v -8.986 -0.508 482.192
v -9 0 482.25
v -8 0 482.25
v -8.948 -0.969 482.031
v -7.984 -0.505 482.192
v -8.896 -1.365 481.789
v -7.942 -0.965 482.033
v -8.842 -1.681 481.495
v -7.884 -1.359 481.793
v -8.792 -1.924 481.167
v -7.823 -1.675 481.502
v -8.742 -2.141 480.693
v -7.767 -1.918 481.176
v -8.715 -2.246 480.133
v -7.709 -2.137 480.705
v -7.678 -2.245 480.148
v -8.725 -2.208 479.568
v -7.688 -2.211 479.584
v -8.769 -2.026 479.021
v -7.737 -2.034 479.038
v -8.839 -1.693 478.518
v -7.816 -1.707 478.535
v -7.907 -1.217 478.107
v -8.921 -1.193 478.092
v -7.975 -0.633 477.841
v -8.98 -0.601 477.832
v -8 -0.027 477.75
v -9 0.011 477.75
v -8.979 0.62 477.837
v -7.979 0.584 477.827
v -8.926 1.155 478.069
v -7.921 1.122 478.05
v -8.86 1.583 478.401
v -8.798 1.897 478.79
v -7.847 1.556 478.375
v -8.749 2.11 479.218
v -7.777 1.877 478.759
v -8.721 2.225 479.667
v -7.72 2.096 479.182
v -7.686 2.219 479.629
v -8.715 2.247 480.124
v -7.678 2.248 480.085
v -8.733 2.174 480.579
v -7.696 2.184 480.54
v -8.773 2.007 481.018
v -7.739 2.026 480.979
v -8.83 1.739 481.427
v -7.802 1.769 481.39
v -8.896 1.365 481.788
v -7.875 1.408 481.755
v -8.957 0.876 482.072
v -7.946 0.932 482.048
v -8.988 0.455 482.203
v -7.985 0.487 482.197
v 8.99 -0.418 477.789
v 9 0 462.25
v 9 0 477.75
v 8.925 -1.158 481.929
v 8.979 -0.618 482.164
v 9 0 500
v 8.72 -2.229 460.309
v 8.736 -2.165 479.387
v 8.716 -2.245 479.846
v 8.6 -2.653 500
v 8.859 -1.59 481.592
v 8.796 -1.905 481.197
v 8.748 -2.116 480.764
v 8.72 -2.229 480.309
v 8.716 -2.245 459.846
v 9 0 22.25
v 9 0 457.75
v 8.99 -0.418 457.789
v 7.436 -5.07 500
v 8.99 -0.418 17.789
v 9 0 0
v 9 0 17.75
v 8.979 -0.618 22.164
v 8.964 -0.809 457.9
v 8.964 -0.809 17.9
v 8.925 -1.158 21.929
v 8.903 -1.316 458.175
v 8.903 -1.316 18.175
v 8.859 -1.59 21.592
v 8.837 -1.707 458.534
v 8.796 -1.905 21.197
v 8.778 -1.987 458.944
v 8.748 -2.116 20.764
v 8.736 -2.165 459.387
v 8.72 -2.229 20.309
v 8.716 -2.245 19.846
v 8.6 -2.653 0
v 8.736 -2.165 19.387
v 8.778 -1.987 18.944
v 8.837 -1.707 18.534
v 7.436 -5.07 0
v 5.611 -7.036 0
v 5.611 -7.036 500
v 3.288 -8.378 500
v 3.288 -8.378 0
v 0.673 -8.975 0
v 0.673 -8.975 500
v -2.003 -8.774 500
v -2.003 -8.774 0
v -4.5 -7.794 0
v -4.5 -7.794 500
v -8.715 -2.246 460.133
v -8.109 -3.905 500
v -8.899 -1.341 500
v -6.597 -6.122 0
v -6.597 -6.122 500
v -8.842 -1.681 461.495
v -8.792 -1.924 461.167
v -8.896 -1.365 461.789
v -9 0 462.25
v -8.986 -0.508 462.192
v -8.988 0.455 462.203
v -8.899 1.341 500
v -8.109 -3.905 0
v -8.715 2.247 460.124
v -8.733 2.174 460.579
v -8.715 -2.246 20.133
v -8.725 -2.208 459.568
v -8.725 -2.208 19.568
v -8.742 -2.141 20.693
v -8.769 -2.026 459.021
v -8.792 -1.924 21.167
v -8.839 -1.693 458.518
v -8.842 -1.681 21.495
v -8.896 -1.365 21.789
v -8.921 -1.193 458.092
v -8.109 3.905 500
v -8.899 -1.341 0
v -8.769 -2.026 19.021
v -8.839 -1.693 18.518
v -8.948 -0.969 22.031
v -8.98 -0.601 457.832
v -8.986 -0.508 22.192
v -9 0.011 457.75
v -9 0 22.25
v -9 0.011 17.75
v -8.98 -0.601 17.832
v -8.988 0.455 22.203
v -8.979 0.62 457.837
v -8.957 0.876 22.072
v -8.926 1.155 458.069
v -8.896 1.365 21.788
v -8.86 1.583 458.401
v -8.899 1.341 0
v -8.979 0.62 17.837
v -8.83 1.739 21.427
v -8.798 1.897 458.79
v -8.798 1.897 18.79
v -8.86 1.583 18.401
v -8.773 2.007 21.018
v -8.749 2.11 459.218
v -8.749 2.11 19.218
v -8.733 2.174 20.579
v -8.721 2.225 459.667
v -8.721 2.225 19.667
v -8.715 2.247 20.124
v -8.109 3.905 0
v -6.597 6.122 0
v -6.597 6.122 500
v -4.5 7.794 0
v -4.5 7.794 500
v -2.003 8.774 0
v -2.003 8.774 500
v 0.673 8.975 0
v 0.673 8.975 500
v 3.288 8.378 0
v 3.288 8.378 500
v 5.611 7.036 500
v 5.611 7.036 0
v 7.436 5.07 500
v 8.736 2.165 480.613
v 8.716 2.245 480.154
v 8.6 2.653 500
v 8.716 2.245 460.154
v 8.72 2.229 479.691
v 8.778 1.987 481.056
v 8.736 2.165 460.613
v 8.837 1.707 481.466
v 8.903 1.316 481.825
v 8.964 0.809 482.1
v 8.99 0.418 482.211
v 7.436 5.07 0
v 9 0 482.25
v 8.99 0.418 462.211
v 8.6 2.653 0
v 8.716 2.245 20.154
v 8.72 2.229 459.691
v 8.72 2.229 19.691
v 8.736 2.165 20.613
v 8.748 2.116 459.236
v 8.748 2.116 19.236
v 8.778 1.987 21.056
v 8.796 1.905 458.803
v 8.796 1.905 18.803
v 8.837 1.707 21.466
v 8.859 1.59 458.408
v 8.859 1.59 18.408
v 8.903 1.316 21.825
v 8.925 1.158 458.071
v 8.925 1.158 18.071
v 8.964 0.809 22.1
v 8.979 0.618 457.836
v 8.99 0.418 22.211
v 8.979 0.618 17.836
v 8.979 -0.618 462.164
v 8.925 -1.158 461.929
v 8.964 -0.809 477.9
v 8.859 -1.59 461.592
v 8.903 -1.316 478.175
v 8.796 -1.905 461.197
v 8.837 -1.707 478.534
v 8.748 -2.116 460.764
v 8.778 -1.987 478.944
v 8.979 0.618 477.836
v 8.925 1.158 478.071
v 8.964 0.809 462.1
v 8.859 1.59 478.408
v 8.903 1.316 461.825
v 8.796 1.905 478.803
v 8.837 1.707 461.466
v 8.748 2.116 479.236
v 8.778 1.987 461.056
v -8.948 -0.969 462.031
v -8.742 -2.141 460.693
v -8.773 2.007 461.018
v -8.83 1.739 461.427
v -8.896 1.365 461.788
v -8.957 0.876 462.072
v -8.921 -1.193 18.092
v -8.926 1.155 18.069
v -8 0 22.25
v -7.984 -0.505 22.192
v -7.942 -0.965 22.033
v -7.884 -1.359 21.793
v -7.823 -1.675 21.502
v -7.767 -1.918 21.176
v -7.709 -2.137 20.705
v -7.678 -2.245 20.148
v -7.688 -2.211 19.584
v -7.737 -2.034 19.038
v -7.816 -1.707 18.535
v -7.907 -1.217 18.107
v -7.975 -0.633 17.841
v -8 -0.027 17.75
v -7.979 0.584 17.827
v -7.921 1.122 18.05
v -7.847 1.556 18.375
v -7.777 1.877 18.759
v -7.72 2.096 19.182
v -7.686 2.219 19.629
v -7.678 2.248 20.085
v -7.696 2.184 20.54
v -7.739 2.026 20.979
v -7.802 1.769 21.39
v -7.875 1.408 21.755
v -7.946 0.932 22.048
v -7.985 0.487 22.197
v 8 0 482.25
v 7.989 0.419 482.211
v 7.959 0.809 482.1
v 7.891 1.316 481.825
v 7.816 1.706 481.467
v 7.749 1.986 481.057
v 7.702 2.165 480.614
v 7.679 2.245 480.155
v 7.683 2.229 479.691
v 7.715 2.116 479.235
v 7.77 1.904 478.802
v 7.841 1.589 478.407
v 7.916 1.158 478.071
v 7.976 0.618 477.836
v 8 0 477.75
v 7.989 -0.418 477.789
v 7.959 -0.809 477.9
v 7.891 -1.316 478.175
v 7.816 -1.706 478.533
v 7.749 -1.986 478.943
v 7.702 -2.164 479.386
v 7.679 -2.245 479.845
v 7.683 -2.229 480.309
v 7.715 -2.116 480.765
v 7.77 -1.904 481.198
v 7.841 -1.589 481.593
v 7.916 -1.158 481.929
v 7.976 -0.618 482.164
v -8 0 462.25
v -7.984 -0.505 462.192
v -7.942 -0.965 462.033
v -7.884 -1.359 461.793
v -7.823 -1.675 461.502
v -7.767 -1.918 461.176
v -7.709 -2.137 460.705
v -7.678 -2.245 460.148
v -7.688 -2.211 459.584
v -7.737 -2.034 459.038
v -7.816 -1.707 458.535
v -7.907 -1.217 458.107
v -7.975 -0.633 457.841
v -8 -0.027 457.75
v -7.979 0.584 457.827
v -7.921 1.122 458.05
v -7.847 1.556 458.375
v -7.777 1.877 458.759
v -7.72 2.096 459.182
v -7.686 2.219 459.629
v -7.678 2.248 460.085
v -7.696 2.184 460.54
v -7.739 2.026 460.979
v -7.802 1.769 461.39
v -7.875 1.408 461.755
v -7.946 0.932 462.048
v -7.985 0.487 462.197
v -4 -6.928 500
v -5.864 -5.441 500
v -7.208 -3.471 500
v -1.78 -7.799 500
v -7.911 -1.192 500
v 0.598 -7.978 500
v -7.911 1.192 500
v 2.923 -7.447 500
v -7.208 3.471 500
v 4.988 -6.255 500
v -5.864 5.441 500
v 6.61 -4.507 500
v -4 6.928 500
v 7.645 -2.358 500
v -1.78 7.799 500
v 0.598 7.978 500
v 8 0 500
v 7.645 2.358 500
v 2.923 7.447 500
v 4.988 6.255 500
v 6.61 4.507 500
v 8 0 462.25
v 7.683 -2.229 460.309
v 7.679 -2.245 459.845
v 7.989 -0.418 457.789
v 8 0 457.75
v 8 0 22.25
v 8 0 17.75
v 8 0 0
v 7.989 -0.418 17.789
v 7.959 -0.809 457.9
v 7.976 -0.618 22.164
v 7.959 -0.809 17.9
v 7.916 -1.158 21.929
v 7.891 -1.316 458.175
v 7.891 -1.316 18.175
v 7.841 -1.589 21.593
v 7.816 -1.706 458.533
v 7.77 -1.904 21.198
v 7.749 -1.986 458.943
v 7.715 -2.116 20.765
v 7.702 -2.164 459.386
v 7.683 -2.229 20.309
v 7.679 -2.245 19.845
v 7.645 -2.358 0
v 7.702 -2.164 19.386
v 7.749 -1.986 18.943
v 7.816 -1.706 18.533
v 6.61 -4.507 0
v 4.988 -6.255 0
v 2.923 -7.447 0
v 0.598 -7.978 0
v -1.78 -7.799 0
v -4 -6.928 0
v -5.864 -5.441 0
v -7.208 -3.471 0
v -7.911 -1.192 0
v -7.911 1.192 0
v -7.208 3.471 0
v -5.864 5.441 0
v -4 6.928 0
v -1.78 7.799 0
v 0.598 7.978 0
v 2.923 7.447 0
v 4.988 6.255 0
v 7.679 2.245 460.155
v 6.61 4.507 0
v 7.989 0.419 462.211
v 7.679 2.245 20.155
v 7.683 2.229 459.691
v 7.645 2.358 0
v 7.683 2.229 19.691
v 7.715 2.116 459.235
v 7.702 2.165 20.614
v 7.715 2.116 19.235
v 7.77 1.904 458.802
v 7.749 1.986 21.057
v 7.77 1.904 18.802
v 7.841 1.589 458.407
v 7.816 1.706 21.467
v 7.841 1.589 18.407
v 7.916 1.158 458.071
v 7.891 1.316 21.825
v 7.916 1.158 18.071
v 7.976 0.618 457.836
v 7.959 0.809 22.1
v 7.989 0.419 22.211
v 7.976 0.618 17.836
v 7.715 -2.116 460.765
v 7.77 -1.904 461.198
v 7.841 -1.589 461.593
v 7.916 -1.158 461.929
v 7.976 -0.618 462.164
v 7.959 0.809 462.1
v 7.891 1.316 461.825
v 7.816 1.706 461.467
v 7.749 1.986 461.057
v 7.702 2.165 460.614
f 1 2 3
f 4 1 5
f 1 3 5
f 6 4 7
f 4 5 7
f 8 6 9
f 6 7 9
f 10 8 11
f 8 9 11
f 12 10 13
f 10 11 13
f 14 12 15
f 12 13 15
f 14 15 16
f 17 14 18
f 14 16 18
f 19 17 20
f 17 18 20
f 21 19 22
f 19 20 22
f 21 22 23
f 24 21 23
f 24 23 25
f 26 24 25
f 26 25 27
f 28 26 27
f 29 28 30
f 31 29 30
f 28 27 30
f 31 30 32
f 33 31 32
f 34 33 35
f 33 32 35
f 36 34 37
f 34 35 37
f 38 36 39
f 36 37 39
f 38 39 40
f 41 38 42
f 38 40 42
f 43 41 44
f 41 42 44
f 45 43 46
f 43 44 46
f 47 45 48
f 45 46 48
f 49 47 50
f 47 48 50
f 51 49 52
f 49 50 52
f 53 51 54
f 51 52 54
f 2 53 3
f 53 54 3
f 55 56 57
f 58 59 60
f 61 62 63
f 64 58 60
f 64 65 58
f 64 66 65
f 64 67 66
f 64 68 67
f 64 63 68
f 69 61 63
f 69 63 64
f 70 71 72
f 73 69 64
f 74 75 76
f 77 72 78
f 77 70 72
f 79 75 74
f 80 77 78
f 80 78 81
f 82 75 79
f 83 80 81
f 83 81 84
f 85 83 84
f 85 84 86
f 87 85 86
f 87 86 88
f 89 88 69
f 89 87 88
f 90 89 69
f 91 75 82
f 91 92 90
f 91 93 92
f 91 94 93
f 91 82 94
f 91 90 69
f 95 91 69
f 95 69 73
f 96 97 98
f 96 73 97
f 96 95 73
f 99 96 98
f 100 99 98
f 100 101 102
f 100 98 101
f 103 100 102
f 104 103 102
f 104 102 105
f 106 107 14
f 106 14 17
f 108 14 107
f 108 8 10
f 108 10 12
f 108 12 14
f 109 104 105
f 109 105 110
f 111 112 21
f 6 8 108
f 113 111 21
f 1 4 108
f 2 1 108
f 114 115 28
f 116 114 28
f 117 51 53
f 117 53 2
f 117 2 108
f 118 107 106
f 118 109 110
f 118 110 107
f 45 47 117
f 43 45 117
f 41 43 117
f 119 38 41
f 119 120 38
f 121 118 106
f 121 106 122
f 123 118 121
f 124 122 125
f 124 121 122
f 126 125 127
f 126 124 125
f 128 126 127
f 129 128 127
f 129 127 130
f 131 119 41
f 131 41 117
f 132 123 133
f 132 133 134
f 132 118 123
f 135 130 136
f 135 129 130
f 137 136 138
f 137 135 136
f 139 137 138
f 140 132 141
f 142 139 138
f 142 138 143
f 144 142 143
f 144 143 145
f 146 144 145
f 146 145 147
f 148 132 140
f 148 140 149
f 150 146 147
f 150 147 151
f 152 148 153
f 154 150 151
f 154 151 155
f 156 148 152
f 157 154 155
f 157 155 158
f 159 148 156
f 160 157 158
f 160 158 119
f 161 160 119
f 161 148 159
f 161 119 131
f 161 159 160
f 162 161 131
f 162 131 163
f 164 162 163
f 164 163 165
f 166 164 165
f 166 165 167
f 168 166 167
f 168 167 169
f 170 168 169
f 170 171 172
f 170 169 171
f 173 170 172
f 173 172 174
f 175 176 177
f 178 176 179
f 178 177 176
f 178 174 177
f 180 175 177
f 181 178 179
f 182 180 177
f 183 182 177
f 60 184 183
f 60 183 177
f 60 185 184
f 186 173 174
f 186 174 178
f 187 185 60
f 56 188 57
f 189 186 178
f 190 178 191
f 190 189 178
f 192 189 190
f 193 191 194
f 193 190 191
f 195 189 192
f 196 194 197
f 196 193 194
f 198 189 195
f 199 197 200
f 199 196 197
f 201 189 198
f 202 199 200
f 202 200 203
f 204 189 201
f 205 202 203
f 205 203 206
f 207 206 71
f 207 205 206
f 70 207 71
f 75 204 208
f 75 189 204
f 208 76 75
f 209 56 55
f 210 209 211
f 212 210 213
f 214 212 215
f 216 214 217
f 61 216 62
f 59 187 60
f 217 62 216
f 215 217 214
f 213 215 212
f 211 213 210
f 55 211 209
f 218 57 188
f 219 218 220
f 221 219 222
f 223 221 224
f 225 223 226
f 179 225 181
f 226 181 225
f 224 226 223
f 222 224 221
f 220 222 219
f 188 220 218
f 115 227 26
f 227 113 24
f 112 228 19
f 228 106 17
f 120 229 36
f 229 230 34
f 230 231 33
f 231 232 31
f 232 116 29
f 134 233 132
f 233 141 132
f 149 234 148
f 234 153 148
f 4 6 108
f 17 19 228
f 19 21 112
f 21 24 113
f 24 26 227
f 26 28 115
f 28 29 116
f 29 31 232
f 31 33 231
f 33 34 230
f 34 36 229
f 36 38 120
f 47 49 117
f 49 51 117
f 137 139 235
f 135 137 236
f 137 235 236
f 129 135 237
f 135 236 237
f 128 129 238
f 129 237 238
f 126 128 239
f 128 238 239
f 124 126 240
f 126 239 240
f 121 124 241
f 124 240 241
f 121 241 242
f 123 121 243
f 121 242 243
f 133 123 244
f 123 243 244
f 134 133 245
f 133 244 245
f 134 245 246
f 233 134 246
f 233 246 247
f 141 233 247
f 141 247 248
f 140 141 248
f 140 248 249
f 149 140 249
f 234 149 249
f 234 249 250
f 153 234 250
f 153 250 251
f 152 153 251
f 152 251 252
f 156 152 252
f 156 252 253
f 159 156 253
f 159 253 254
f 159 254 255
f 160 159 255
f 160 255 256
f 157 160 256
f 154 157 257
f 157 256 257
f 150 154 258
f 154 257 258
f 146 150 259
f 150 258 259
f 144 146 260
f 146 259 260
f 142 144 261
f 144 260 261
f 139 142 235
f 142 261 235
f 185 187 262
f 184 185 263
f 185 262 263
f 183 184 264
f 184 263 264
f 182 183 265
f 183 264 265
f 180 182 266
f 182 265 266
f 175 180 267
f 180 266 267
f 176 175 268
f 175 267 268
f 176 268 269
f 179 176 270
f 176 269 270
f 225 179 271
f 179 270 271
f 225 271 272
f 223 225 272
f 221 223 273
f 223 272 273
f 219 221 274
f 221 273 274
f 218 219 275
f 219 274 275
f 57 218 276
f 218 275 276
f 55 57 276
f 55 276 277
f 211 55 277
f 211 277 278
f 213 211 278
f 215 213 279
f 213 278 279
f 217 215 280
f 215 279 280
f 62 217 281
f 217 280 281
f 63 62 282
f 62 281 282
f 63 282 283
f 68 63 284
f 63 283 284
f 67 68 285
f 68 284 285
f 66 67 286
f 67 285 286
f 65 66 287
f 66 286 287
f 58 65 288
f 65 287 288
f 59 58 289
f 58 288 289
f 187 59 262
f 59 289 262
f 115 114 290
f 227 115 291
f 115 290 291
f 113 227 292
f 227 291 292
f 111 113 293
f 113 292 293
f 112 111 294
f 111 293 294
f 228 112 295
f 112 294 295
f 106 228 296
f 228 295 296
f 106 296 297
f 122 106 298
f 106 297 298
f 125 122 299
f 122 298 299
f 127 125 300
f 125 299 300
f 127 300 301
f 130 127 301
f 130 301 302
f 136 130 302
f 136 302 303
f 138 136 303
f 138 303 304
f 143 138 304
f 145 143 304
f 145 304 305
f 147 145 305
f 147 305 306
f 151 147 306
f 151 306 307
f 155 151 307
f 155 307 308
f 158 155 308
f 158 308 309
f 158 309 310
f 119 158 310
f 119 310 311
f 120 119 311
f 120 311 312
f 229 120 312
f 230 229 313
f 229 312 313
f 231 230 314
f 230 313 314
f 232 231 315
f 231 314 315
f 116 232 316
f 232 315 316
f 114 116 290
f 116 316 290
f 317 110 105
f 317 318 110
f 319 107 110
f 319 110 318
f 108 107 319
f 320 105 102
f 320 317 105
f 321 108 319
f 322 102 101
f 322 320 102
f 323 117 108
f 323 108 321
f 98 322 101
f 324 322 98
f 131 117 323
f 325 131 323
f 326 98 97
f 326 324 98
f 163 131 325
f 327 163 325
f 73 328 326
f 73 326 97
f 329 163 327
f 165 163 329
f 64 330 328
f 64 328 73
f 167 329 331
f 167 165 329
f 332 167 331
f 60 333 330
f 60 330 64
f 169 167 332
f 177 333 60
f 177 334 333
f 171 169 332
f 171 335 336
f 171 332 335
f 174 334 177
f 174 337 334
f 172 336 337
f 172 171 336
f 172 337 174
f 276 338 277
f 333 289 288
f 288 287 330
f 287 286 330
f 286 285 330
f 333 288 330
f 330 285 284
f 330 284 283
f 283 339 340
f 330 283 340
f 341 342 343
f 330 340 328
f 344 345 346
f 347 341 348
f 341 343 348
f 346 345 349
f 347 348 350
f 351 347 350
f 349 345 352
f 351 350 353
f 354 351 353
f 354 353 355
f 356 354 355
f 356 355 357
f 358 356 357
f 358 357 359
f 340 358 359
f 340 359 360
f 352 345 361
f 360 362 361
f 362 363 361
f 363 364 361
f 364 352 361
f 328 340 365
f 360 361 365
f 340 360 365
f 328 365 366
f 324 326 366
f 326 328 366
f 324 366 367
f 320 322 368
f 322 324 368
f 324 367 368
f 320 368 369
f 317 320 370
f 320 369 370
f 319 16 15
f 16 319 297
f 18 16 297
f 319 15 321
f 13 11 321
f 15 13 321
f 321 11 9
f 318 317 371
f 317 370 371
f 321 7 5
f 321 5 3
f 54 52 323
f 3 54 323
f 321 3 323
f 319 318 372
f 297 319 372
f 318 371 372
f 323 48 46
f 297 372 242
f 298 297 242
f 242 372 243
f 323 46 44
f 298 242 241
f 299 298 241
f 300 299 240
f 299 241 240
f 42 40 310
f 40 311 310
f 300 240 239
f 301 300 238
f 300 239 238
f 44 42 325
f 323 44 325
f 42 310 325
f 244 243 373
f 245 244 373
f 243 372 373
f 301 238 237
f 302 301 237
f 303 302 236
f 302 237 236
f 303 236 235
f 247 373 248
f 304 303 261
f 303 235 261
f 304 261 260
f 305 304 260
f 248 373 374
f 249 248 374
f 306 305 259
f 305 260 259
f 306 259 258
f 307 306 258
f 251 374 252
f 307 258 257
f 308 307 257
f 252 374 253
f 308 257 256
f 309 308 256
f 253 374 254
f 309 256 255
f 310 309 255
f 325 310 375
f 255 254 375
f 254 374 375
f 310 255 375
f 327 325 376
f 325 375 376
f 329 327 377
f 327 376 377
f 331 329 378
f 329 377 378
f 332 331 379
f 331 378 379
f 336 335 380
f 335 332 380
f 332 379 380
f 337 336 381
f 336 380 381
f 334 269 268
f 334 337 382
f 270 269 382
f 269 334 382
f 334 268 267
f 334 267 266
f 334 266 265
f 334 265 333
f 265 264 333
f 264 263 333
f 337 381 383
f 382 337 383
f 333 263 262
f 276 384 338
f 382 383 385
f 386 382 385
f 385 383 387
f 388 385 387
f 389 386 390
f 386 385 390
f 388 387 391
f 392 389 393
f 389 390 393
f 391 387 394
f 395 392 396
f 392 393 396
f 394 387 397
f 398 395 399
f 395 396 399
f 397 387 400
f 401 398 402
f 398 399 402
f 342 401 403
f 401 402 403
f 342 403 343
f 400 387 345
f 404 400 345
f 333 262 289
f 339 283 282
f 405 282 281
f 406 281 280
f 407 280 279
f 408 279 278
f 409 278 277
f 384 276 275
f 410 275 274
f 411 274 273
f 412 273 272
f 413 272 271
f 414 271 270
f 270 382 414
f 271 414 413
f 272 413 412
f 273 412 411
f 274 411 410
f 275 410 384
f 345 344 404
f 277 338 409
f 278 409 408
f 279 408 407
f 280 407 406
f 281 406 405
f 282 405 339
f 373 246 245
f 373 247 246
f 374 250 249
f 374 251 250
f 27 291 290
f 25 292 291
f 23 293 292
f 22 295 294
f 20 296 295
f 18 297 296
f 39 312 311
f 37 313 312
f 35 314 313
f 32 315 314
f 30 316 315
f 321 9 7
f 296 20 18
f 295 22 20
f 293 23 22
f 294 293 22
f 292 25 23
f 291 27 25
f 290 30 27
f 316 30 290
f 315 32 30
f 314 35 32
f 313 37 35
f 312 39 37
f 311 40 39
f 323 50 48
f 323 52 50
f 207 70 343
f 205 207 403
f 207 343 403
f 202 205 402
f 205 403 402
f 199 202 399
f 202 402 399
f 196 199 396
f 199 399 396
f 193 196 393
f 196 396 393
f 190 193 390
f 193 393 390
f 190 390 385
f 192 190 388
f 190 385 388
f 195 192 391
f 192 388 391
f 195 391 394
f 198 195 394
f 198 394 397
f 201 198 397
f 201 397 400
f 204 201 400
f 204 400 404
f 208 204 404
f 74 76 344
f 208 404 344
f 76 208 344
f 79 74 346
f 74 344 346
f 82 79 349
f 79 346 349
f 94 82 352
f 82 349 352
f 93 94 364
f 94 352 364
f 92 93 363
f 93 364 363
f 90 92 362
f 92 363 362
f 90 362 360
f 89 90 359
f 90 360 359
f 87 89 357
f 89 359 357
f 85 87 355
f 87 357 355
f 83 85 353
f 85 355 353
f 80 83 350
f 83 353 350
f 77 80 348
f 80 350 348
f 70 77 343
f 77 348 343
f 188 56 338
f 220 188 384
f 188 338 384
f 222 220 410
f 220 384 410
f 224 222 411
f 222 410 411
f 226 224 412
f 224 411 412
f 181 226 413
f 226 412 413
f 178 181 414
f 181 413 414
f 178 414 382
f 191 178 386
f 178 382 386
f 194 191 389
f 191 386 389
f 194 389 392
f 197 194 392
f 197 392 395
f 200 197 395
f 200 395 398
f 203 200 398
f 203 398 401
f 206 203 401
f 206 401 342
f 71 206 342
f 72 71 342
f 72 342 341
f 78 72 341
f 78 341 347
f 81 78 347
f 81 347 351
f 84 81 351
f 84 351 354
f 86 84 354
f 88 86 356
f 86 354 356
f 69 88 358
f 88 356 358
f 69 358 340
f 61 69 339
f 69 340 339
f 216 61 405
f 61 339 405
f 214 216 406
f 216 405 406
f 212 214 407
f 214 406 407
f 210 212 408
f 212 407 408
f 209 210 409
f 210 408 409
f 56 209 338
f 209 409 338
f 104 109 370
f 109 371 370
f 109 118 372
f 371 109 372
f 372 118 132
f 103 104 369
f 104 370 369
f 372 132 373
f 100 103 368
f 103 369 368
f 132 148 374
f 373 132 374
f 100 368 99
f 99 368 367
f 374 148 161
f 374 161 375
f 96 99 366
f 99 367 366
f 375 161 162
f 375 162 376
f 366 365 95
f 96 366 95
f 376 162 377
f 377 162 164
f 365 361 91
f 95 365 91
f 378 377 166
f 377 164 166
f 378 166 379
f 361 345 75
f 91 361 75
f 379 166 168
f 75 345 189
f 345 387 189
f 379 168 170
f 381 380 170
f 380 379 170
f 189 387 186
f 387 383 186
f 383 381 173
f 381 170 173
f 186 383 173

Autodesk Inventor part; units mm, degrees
ref_plane "YZ Plane" through (0, 0, 0) normal (1, 0, 0) x (0, 1, 0)
ref_plane "XZ Plane" through (0, 0, 0) normal (0, 1, 0) x (-1, 0, 0)
sketch "Sketch1" plane through (0, 0, 0) normal (0, 0, 1) x (1, 0, 0)
  circle A0 centre (0, 0) radius 8
  circle A1 centre (0, 0) radius 9
  dimension "d0" = 16
  dimension "d1" = 18
extrude "Extrusion1" add sketch "Sketch1" along normal blind 500
ref_plane "Work Plane2" through (5.5, 0, -32) normal (1, 0, 0) x (0, 0, 1)
sketch "Sketch2" plane through (5.5, 0, -32) normal (1, 0, 0) x (0, 0, 1)
  circle A0 centre (52, 0) radius 2.25
  line L0 (32, -9) -> (32, 9) projected
  circle A1 centre (512, 0) radius 2.25
  circle A2 centre (492, 0) radius 2.25
  line L1 (532, -9) -> (532, 9) projected
  point P0 (32, 0)
  dimension "d4" = 4.5
  dimension "d5" = 20
  dimension "d8" = 4.5
  dimension "d9" = 4.5
  dimension "d10" = 20
  dimension "d11" = 20
extrude "Extrusion2" cut sketch "Sketch2" along normal through all both and the other way through all
properties part number "BodyTube" material "Aluminum 6061"
